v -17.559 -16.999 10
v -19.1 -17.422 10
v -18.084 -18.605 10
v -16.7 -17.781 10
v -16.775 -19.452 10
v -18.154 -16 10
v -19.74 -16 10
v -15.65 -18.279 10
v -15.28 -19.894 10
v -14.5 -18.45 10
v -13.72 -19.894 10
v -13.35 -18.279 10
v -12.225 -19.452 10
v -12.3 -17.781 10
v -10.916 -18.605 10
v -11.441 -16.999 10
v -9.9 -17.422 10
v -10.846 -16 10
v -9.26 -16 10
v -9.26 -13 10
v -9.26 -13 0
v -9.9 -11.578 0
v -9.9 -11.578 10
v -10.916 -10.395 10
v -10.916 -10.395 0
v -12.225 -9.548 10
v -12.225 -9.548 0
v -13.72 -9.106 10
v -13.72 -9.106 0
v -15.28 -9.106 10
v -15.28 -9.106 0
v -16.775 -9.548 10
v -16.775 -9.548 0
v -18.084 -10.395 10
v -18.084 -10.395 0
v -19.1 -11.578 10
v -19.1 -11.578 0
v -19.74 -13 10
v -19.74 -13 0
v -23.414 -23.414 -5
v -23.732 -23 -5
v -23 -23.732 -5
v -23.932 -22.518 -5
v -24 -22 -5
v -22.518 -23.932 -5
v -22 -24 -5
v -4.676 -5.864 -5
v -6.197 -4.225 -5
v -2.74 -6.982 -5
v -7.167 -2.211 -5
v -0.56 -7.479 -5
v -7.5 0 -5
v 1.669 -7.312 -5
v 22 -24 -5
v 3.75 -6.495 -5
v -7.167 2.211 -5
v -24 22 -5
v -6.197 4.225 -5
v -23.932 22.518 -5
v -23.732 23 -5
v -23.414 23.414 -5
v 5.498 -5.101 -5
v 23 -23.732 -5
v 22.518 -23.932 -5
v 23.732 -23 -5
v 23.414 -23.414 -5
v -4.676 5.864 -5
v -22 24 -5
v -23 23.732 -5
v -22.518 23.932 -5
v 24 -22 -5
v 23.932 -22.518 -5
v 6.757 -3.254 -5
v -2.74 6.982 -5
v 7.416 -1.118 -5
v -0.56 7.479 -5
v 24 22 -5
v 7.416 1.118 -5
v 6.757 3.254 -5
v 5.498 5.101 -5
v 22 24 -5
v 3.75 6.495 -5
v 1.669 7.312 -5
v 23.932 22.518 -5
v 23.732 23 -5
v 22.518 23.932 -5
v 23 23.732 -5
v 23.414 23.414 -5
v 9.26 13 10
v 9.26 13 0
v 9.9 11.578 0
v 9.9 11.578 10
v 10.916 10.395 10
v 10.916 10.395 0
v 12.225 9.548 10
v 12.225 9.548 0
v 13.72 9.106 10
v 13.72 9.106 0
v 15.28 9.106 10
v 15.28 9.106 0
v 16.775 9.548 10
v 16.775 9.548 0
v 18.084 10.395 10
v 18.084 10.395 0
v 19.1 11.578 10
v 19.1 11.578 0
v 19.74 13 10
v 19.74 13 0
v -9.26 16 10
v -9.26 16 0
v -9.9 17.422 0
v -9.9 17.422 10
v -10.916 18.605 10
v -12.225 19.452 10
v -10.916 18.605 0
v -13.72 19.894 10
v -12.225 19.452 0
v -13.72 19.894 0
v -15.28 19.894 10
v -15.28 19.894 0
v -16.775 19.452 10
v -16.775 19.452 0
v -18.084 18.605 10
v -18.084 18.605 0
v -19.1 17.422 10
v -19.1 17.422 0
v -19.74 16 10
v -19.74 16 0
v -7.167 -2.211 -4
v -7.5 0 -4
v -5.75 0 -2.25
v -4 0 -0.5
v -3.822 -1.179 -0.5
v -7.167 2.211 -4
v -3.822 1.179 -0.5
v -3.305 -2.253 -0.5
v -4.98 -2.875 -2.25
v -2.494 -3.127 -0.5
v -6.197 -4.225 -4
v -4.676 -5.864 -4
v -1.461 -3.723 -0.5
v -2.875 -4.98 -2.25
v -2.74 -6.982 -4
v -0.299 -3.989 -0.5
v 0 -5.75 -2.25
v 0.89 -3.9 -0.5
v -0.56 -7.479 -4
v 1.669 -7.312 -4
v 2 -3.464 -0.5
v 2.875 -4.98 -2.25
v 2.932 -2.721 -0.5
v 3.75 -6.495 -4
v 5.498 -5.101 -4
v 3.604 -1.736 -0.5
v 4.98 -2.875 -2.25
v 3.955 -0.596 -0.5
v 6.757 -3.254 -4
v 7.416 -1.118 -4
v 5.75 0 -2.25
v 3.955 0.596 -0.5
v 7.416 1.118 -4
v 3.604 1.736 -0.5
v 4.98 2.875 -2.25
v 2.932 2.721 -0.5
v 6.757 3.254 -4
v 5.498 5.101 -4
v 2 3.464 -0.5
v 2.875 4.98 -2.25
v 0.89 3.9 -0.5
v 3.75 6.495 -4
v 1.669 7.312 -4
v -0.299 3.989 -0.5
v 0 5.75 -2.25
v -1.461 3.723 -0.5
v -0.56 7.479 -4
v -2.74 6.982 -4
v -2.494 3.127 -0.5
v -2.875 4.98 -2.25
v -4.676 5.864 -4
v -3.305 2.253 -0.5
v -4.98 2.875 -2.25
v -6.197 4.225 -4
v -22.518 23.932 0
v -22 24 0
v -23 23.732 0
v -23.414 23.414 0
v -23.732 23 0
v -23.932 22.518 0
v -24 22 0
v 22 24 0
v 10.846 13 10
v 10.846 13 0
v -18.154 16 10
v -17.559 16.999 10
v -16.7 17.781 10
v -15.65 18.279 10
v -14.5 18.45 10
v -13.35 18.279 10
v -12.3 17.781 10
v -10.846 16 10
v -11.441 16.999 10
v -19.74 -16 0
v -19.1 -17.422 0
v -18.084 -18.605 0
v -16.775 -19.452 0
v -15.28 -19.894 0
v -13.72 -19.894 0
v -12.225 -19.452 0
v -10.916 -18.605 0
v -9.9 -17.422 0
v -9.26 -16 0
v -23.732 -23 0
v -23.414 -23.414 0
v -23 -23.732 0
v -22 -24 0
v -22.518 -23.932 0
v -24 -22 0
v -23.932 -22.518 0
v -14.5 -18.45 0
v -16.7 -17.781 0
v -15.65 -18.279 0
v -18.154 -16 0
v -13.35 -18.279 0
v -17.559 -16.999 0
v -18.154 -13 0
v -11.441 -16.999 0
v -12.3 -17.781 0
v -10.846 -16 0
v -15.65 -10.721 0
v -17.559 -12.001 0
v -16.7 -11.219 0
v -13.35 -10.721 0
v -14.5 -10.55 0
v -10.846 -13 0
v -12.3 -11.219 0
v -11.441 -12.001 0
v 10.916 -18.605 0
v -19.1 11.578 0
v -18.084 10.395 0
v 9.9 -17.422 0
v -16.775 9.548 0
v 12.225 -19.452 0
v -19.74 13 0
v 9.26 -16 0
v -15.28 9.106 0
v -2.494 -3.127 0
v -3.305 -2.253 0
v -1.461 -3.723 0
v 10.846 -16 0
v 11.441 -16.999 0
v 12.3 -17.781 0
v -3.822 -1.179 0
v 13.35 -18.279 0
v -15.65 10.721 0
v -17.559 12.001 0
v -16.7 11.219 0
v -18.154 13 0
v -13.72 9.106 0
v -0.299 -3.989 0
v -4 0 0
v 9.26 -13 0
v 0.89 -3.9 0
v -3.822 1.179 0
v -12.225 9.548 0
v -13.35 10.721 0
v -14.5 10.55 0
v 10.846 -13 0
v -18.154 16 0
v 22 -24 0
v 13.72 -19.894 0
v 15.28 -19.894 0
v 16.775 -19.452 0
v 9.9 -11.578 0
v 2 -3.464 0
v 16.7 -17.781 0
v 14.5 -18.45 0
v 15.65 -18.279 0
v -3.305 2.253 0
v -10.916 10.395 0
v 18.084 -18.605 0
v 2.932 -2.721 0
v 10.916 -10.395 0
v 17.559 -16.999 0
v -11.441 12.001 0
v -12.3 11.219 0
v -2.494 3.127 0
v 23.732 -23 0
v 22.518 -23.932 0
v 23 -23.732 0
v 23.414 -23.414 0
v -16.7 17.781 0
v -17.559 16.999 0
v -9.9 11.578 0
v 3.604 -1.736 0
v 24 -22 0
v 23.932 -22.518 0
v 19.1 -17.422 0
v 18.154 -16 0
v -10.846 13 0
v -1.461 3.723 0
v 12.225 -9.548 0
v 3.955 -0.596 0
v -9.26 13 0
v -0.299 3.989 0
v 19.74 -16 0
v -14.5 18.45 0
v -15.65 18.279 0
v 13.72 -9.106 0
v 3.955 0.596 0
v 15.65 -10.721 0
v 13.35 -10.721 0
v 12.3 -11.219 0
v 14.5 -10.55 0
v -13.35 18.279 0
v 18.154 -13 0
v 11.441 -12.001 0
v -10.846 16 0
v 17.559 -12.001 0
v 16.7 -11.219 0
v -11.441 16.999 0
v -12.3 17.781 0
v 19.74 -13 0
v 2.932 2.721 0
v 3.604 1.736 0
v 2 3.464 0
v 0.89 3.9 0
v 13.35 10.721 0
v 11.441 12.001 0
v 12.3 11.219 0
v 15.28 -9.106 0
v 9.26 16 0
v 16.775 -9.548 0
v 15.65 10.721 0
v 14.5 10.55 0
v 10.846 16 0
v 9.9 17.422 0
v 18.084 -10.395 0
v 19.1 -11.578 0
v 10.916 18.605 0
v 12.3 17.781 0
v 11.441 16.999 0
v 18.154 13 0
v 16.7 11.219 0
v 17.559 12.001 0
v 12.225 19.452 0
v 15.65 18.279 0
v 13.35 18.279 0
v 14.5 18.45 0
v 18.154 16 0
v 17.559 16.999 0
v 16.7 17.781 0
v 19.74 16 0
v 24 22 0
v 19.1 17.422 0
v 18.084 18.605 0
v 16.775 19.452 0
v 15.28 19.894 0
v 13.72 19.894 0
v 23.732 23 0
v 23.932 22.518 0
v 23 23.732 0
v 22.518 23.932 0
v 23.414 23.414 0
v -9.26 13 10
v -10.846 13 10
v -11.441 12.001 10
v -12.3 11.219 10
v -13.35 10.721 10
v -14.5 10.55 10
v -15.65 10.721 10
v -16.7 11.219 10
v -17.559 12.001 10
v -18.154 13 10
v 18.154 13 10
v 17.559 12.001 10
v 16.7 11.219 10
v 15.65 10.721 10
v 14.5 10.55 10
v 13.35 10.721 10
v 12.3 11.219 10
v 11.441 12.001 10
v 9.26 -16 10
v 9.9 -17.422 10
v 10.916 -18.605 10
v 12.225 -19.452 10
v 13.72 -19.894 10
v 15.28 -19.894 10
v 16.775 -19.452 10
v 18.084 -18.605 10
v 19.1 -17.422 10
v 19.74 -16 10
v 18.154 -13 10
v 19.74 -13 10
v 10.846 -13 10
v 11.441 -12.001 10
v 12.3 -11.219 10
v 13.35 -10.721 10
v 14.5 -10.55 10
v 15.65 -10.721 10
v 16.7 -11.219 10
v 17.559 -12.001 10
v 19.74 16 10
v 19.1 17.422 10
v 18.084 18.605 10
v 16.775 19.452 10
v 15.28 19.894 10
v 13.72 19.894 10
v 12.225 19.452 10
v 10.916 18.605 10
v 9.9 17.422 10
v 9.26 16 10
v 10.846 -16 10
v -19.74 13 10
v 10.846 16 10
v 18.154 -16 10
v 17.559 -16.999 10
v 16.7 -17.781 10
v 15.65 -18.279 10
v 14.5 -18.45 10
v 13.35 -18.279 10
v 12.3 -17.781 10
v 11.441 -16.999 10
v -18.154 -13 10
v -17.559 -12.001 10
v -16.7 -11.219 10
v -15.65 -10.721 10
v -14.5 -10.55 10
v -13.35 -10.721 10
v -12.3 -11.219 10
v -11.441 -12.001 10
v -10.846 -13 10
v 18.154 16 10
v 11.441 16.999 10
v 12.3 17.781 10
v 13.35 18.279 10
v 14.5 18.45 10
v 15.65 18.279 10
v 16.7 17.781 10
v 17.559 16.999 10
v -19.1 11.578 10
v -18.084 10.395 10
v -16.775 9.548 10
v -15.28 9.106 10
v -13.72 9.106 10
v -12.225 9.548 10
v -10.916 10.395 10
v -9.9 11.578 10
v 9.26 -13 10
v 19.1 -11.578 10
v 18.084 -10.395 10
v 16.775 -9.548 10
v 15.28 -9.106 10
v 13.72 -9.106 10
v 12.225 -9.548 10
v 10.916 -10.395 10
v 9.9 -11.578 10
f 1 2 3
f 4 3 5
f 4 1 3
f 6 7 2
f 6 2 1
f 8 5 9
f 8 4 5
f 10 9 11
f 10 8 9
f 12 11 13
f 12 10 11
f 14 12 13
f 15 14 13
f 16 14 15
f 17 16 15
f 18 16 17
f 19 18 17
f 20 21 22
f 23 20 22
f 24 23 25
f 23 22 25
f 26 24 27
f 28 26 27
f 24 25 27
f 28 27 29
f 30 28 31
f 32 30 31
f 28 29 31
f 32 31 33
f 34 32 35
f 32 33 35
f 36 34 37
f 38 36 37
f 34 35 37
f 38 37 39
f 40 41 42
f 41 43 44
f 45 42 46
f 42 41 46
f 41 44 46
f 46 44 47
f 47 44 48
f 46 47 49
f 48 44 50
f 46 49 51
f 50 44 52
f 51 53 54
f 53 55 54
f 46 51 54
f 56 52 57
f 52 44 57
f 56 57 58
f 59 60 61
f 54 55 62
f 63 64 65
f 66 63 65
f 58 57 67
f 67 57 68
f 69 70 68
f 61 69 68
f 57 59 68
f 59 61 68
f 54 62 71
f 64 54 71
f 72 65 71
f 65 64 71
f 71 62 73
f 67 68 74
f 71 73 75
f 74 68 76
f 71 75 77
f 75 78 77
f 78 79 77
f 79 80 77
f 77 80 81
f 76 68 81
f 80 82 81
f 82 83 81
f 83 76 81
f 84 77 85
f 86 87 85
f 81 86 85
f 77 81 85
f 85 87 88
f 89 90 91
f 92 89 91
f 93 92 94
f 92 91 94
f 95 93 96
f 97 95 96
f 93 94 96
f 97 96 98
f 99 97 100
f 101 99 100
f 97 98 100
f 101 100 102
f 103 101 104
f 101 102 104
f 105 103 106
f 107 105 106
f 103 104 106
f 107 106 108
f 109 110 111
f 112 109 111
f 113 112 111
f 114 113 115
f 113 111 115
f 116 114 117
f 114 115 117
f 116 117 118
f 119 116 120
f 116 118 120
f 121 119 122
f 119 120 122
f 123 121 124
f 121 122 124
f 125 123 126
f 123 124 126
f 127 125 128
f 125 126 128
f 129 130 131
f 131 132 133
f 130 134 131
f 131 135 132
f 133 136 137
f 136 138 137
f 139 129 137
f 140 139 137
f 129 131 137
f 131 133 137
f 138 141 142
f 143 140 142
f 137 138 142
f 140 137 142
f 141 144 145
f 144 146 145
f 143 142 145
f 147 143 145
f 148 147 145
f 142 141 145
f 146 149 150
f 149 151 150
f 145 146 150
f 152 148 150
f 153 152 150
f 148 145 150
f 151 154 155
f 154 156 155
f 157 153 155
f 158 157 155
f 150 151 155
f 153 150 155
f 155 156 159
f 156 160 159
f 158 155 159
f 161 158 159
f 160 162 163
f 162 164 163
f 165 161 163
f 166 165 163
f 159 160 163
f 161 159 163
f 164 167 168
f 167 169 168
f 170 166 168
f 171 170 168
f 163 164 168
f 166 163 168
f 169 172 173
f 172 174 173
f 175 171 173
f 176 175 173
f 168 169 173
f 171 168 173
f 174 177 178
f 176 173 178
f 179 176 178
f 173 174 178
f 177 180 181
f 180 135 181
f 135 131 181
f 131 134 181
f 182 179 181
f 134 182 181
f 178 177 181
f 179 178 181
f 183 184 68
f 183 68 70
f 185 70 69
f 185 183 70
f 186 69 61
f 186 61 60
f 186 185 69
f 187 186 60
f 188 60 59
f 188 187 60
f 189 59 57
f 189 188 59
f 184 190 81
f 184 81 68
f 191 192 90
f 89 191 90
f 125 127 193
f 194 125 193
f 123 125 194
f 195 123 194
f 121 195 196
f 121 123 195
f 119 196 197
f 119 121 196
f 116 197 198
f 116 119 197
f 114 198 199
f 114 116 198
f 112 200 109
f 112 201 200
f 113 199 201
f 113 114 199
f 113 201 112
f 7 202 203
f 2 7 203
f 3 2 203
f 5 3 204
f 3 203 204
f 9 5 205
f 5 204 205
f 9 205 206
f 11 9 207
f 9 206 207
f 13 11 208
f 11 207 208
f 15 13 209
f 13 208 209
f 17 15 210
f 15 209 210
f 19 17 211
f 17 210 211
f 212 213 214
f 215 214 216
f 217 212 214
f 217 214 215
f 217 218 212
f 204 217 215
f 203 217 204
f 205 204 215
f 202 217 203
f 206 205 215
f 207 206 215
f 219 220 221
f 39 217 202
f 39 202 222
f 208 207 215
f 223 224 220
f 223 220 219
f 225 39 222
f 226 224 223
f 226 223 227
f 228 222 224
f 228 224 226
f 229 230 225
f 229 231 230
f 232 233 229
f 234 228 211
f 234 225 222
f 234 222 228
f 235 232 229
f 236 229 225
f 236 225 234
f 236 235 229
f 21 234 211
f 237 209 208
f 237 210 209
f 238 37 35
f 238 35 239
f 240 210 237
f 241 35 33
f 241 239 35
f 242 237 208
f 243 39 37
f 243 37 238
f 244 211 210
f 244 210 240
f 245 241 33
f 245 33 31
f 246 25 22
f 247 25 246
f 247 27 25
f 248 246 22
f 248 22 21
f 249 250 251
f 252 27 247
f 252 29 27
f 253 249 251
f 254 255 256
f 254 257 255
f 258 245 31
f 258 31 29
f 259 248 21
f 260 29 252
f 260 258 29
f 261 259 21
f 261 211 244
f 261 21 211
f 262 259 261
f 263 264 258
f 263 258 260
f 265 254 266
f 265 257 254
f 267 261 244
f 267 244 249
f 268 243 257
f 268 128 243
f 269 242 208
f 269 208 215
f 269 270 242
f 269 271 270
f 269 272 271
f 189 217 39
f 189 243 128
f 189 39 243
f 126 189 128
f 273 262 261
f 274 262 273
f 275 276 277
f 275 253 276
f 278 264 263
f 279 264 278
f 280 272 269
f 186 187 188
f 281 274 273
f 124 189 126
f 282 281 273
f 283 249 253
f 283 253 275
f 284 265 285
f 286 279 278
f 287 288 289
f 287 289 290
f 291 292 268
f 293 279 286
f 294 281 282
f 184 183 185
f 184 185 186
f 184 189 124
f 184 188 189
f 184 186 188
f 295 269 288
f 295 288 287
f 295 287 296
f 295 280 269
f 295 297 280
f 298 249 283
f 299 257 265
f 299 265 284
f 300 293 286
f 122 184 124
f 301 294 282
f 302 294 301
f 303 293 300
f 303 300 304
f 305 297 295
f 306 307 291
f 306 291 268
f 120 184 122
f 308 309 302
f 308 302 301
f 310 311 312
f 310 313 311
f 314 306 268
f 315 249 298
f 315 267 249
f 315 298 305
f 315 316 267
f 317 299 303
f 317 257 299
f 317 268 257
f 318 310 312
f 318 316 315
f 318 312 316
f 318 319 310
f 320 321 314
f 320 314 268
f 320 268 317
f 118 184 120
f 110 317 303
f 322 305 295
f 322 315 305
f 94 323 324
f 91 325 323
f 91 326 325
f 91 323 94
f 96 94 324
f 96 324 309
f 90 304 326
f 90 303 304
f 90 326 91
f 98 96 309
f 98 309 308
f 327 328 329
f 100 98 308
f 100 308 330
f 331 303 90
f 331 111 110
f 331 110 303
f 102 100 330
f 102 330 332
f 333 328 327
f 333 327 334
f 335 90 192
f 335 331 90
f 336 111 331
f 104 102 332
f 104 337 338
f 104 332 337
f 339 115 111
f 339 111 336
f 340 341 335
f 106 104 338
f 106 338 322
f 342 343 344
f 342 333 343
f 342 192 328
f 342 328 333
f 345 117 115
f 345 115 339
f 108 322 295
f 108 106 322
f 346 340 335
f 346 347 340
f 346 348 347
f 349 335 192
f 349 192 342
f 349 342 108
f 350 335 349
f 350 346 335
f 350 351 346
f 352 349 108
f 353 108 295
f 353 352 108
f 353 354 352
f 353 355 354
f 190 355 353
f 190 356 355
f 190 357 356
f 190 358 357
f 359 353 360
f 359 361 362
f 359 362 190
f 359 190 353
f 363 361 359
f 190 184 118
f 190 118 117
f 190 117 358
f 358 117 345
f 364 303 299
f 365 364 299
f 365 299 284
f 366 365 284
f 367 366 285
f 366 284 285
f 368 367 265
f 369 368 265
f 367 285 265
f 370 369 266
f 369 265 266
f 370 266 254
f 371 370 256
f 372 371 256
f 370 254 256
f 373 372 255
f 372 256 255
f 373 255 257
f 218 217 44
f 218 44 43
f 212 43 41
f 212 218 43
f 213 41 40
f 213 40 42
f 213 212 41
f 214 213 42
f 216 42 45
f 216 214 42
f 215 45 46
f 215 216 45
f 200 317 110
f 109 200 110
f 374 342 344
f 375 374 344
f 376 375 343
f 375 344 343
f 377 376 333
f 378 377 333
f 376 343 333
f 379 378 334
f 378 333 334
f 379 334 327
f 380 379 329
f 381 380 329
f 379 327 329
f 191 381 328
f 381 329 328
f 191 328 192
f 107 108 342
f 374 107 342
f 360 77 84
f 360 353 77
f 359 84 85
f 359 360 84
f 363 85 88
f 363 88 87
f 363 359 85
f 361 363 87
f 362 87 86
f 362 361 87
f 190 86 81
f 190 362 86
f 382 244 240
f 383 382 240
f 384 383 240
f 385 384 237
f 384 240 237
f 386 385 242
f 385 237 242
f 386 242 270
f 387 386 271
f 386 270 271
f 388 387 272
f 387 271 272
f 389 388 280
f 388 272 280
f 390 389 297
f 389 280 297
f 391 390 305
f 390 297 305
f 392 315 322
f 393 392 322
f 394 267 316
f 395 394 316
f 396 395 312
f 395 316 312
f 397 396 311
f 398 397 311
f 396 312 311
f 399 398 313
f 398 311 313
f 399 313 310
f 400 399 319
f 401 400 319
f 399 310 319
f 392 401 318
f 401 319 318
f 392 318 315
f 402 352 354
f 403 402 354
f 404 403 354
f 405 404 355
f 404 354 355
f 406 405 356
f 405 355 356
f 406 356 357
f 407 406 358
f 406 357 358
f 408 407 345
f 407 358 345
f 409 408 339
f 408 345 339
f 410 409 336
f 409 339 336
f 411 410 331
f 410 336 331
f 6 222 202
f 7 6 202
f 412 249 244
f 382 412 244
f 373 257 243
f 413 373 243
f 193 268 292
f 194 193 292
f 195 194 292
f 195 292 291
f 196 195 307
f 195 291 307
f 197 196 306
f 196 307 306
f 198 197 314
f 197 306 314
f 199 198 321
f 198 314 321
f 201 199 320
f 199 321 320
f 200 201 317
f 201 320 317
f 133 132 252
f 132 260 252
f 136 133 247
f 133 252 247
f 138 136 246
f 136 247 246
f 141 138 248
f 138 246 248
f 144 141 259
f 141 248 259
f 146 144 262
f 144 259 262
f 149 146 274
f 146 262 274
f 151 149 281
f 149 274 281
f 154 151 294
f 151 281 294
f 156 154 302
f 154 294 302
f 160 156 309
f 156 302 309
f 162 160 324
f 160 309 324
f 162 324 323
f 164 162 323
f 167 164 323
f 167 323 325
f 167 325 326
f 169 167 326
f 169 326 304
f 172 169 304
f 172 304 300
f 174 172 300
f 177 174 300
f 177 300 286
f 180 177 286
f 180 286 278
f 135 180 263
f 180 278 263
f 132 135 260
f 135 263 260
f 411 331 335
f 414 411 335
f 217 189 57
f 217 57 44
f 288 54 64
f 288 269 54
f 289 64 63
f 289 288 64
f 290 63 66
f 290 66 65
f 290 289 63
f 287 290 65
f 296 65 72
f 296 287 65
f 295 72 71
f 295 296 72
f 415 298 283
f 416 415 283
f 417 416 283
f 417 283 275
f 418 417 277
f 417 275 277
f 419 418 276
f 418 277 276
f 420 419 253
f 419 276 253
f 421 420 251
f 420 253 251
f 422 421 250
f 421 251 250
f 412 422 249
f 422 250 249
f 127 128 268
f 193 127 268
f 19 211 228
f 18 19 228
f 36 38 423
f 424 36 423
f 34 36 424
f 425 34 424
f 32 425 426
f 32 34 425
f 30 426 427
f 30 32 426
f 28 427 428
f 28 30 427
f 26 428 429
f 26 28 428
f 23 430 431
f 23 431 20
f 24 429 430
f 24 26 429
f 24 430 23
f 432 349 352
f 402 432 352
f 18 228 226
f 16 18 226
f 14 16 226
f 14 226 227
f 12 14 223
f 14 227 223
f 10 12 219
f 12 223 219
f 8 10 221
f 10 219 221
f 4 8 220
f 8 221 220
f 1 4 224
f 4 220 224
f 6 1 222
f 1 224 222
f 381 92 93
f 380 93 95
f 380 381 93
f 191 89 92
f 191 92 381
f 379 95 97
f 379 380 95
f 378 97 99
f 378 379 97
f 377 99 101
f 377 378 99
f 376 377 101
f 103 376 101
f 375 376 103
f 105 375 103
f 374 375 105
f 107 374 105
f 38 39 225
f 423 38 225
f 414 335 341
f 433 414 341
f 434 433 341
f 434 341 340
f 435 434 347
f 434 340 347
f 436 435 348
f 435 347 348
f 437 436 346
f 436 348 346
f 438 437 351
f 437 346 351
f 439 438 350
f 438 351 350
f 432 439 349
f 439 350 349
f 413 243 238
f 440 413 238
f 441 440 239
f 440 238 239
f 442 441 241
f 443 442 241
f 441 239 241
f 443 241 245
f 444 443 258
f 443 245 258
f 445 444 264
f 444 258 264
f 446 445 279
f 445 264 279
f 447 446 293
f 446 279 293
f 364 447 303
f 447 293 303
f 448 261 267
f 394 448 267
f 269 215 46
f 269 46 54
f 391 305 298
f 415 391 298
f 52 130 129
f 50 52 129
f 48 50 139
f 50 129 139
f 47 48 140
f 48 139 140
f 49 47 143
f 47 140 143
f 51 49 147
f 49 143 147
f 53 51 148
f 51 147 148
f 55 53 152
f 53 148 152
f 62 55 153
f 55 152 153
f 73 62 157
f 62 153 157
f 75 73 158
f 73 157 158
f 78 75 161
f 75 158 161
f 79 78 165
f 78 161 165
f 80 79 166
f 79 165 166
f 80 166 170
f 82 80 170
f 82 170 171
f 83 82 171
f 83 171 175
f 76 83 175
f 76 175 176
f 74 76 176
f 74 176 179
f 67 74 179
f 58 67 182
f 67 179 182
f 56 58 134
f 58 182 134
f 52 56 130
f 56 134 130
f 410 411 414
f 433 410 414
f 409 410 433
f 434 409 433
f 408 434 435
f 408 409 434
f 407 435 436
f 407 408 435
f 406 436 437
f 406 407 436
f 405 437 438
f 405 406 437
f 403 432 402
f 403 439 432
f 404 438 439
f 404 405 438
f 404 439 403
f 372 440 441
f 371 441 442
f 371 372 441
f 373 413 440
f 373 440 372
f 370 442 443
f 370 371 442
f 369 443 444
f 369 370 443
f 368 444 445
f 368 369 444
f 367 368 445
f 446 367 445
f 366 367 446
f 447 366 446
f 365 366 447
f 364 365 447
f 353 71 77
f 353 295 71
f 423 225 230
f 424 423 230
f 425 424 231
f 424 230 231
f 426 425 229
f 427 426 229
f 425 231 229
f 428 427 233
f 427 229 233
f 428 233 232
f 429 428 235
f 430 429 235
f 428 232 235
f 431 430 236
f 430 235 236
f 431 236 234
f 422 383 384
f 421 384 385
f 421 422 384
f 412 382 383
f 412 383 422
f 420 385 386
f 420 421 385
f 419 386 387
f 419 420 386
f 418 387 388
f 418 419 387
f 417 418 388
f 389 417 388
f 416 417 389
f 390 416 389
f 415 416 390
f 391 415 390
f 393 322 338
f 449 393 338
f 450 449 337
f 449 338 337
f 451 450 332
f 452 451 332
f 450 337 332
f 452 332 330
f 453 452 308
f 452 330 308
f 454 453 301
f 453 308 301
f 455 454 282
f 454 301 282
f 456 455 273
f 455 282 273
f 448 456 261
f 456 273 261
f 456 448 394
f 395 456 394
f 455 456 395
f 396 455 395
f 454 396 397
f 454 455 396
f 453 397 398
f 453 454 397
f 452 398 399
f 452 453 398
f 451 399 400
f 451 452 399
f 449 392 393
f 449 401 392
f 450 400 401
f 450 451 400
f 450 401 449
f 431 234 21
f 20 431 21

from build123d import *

# Parameters (mm, degrees)
F0_W           = 36
F0_H           = 36
F1_DEPTH       = 4
F3_DEPTH       = 10
F5_D           = 8
F5_CSINK_D     = 15
F5_CSINK_ANGLE = 90
F6_DEPTH       = 1


with BuildPart() as f1:
    # F0 (on Top) → F1 (new body)
    with BuildSketch(Plane.XY):
        with BuildLine():
            ThreePointArc((24, 22), (23.4142135624, 23.4142135624), (22, 24))
            Line((22, 24), (-22, 24))
            ThreePointArc((-22, 24), (-23.4142135624, 23.4142135624), (-24, 22))
            Line((-24, 22), (-24, -22))
            ThreePointArc((-24, -22), (-23.4142135624, -23.4142135624), (-22, -24))
            Line((-22, -24), (22, -24))
            ThreePointArc((22, -24), (23.4142135624, -23.4142135624), (24, -22))
            Line((24, -22), (24, 22))
        make_face()
        Rectangle(F0_W, F0_H, mode=Mode.SUBTRACT)
        Rectangle(F0_W, F0_H)
    extrude(amount=-F1_DEPTH)

    # F2 (on face) → F3 (join)
    with BuildSketch(Plane.XY):
        with BuildLine():
            Line((18.1541072781, 16), (19.7395133362, 16))
            ThreePointArc((19.7395133362, 16), (14.5, 19.95), (9.2604866638, 16))
            Line((9.2604866638, 16), (10.8458927219, 16))
            ThreePointArc((10.8458927219, 16), (14.5, 18.45), (18.1541072781, 16))
        make_face()
        with BuildLine():
            ThreePointArc((9.2604866638, 13), (14.5, 9.05), (19.7395133362, 13))
            Line((19.7395133362, 13), (18.1541072781, 13))
            ThreePointArc((18.1541072781, 13), (14.5, 10.55), (10.8458927219, 13))
            Line((10.8458927219, 13), (9.2604866638, 13))
        make_face()
        with BuildLine():
            Line((-10.8458927219, 16), (-9.2604866638, 16))
            ThreePointArc((-9.2604866638, 16), (-14.5, 19.95), (-19.7395133362, 16))
            Line((-19.7395133362, 16), (-18.1541072781, 16))
            ThreePointArc((-18.1541072781, 16), (-14.5, 18.45), (-10.8458927219, 16))
        make_face()
        with BuildLine():
            ThreePointArc((-19.7395133362, 13), (-14.5, 9.05), (-9.2604866638, 13))
            Line((-9.2604866638, 13), (-10.8458927219, 13))
            ThreePointArc((-10.8458927219, 13), (-14.5, 10.55), (-18.1541072781, 13))
            Line((-18.1541072781, 13), (-19.7395133362, 13))
        make_face()
        with BuildLine():
            Line((18.1541072781, -13), (19.7395133362, -13))
            ThreePointArc((19.7395133362, -13), (14.5, -9.05), (9.2604866638, -13))
            Line((9.2604866638, -13), (10.8458927219, -13))
            ThreePointArc((10.8458927219, -13), (14.5, -10.55), (18.1541072781, -13))
        make_face()
        with BuildLine():
            ThreePointArc((9.2604866638, -16), (14.5, -19.95), (19.7395133362, -16))
            Line((19.7395133362, -16), (18.1541072781, -16))
            ThreePointArc((18.1541072781, -16), (14.5, -18.45), (10.8458927219, -16))
            Line((10.8458927219, -16), (9.2604866638, -16))
        make_face()
        with BuildLine():
            ThreePointArc((-9.2604866638, -13), (-14.5, -9.05), (-19.7395133362, -13))
            Line((-19.7395133362, -13), (-18.1541072781, -13))
            ThreePointArc((-18.1541072781, -13), (-14.5, -10.55), (-10.8458927219, -13))
            Line((-10.8458927219, -13), (-9.2604866638, -13))
        make_face()
        with BuildLine():
            Line((-18.1541072781, -16), (-19.7395133362, -16))
            ThreePointArc((-19.7395133362, -16), (-14.5, -19.95), (-9.2604866638, -16))
            Line((-9.2604866638, -16), (-10.8458927219, -16))
            ThreePointArc((-10.8458927219, -16), (-14.5, -18.45), (-18.1541072781, -16))
        make_face()
    extrude(amount=F3_DEPTH)

    # F5 (through all)
    with Locations(Plane(origin=(0, 0, -4), x_dir=(1, 0, 0), z_dir=(0, 0, -1))):
        with Locations((0, 0)):
            CounterSinkHole(F5_D / 2, F5_CSINK_D / 2, counter_sink_angle=F5_CSINK_ANGLE)

    # F6 (add): a face of the model
    f6_faces = [f1.faces().sort_by_distance(p)[0] for p in [
        (22.9342135624, 22.9342135624, -4),
    ]]
    extrude(f6_faces, amount=F6_DEPTH)


solid = f1.part
